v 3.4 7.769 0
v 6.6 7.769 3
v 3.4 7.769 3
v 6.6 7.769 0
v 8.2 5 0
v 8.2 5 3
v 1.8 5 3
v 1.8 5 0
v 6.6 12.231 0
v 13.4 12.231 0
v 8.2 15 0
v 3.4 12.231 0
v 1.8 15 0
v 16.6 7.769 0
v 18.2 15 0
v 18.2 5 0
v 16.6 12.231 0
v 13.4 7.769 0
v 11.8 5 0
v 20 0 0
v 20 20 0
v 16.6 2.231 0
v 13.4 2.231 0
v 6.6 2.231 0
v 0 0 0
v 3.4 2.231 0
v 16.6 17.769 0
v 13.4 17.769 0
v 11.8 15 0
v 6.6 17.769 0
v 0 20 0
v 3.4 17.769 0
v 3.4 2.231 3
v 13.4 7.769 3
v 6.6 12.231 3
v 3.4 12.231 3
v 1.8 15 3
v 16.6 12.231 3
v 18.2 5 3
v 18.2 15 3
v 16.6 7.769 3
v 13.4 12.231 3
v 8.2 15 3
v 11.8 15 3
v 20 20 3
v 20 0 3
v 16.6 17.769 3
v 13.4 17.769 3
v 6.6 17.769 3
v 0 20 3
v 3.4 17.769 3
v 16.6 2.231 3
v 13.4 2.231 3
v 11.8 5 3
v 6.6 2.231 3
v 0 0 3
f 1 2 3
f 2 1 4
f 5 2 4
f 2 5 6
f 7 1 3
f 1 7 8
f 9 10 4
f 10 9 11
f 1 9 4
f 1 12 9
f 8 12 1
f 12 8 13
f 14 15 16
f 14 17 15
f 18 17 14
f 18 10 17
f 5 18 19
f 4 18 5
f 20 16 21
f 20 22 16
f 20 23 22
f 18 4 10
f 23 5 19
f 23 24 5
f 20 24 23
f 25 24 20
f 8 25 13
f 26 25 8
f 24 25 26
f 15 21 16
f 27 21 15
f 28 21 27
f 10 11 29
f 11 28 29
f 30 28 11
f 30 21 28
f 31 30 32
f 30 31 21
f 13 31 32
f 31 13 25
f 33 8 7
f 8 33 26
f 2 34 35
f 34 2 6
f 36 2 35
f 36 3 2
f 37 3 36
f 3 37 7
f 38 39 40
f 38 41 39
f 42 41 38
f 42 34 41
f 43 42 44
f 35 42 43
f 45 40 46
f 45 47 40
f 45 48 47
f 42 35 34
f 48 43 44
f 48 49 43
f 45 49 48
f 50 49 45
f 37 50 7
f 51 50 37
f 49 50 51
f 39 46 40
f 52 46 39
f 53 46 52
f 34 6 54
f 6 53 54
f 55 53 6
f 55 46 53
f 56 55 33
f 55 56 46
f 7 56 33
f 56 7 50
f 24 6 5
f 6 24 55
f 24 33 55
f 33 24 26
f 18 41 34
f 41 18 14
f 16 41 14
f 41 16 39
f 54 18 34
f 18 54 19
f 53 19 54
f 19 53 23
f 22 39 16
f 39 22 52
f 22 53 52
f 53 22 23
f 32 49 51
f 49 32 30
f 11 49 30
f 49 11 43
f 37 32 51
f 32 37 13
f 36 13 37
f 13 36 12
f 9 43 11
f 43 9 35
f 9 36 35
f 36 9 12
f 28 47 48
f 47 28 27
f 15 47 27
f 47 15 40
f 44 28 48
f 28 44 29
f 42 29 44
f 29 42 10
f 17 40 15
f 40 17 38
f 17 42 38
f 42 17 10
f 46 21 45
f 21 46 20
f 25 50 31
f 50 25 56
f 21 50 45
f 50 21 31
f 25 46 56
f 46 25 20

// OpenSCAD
difference() {
  translate([10.0000000000, 10.0000000000, 1.5000000000]) {
    scale([20.0000000000, 20.0000000000, 3.0000000000]) {
      translate([-0.5000000000, -0.5000000000, -0.5000000000]) {
        cube([1, 1, 1]);
      }
    }
  }
  union() {
    union() {
      union() {
        translate([5.0000000000, 5.0000000000, 1.5000000000]) {
          scale([6.4000000000, 5.5420000000, 3.0000000000]) {
            rotate([0.0000000000, 0.0000000000, -0.0000000000]) {
              scale([0.5, 0.577, 1]) cylinder($fn = 6, center = true);
            }
          }
        }
        translate([15.0000000000, 5.0000000000, 1.5000000000]) {
          scale([6.4000000000, 5.5420000000, 3.0000000000]) {
            rotate([0.0000000000, 0.0000000000, -0.0000000000]) {
              scale([0.5, 0.577, 1]) cylinder($fn = 6, center = true);
            }
          }
        }
      }
      translate([5.0000000000, 15.0000000000, 1.5000000000]) {
        scale([6.4000000000, 5.5420000000, 3.0000000000]) {
          rotate([0.0000000000, 0.0000000000, -0.0000000000]) {
            scale([0.5, 0.577, 1]) cylinder($fn = 6, center = true);
          }
        }
      }
    }
    translate([15.0000000000, 15.0000000000, 1.5000000000]) {
      scale([6.4000000000, 5.5420000000, 3.0000000000]) {
        rotate([0.0000000000, 0.0000000000, -0.0000000000]) {
          scale([0.5, 0.577, 1]) cylinder($fn = 6, center = true);
        }
      }
    }
  }
}
